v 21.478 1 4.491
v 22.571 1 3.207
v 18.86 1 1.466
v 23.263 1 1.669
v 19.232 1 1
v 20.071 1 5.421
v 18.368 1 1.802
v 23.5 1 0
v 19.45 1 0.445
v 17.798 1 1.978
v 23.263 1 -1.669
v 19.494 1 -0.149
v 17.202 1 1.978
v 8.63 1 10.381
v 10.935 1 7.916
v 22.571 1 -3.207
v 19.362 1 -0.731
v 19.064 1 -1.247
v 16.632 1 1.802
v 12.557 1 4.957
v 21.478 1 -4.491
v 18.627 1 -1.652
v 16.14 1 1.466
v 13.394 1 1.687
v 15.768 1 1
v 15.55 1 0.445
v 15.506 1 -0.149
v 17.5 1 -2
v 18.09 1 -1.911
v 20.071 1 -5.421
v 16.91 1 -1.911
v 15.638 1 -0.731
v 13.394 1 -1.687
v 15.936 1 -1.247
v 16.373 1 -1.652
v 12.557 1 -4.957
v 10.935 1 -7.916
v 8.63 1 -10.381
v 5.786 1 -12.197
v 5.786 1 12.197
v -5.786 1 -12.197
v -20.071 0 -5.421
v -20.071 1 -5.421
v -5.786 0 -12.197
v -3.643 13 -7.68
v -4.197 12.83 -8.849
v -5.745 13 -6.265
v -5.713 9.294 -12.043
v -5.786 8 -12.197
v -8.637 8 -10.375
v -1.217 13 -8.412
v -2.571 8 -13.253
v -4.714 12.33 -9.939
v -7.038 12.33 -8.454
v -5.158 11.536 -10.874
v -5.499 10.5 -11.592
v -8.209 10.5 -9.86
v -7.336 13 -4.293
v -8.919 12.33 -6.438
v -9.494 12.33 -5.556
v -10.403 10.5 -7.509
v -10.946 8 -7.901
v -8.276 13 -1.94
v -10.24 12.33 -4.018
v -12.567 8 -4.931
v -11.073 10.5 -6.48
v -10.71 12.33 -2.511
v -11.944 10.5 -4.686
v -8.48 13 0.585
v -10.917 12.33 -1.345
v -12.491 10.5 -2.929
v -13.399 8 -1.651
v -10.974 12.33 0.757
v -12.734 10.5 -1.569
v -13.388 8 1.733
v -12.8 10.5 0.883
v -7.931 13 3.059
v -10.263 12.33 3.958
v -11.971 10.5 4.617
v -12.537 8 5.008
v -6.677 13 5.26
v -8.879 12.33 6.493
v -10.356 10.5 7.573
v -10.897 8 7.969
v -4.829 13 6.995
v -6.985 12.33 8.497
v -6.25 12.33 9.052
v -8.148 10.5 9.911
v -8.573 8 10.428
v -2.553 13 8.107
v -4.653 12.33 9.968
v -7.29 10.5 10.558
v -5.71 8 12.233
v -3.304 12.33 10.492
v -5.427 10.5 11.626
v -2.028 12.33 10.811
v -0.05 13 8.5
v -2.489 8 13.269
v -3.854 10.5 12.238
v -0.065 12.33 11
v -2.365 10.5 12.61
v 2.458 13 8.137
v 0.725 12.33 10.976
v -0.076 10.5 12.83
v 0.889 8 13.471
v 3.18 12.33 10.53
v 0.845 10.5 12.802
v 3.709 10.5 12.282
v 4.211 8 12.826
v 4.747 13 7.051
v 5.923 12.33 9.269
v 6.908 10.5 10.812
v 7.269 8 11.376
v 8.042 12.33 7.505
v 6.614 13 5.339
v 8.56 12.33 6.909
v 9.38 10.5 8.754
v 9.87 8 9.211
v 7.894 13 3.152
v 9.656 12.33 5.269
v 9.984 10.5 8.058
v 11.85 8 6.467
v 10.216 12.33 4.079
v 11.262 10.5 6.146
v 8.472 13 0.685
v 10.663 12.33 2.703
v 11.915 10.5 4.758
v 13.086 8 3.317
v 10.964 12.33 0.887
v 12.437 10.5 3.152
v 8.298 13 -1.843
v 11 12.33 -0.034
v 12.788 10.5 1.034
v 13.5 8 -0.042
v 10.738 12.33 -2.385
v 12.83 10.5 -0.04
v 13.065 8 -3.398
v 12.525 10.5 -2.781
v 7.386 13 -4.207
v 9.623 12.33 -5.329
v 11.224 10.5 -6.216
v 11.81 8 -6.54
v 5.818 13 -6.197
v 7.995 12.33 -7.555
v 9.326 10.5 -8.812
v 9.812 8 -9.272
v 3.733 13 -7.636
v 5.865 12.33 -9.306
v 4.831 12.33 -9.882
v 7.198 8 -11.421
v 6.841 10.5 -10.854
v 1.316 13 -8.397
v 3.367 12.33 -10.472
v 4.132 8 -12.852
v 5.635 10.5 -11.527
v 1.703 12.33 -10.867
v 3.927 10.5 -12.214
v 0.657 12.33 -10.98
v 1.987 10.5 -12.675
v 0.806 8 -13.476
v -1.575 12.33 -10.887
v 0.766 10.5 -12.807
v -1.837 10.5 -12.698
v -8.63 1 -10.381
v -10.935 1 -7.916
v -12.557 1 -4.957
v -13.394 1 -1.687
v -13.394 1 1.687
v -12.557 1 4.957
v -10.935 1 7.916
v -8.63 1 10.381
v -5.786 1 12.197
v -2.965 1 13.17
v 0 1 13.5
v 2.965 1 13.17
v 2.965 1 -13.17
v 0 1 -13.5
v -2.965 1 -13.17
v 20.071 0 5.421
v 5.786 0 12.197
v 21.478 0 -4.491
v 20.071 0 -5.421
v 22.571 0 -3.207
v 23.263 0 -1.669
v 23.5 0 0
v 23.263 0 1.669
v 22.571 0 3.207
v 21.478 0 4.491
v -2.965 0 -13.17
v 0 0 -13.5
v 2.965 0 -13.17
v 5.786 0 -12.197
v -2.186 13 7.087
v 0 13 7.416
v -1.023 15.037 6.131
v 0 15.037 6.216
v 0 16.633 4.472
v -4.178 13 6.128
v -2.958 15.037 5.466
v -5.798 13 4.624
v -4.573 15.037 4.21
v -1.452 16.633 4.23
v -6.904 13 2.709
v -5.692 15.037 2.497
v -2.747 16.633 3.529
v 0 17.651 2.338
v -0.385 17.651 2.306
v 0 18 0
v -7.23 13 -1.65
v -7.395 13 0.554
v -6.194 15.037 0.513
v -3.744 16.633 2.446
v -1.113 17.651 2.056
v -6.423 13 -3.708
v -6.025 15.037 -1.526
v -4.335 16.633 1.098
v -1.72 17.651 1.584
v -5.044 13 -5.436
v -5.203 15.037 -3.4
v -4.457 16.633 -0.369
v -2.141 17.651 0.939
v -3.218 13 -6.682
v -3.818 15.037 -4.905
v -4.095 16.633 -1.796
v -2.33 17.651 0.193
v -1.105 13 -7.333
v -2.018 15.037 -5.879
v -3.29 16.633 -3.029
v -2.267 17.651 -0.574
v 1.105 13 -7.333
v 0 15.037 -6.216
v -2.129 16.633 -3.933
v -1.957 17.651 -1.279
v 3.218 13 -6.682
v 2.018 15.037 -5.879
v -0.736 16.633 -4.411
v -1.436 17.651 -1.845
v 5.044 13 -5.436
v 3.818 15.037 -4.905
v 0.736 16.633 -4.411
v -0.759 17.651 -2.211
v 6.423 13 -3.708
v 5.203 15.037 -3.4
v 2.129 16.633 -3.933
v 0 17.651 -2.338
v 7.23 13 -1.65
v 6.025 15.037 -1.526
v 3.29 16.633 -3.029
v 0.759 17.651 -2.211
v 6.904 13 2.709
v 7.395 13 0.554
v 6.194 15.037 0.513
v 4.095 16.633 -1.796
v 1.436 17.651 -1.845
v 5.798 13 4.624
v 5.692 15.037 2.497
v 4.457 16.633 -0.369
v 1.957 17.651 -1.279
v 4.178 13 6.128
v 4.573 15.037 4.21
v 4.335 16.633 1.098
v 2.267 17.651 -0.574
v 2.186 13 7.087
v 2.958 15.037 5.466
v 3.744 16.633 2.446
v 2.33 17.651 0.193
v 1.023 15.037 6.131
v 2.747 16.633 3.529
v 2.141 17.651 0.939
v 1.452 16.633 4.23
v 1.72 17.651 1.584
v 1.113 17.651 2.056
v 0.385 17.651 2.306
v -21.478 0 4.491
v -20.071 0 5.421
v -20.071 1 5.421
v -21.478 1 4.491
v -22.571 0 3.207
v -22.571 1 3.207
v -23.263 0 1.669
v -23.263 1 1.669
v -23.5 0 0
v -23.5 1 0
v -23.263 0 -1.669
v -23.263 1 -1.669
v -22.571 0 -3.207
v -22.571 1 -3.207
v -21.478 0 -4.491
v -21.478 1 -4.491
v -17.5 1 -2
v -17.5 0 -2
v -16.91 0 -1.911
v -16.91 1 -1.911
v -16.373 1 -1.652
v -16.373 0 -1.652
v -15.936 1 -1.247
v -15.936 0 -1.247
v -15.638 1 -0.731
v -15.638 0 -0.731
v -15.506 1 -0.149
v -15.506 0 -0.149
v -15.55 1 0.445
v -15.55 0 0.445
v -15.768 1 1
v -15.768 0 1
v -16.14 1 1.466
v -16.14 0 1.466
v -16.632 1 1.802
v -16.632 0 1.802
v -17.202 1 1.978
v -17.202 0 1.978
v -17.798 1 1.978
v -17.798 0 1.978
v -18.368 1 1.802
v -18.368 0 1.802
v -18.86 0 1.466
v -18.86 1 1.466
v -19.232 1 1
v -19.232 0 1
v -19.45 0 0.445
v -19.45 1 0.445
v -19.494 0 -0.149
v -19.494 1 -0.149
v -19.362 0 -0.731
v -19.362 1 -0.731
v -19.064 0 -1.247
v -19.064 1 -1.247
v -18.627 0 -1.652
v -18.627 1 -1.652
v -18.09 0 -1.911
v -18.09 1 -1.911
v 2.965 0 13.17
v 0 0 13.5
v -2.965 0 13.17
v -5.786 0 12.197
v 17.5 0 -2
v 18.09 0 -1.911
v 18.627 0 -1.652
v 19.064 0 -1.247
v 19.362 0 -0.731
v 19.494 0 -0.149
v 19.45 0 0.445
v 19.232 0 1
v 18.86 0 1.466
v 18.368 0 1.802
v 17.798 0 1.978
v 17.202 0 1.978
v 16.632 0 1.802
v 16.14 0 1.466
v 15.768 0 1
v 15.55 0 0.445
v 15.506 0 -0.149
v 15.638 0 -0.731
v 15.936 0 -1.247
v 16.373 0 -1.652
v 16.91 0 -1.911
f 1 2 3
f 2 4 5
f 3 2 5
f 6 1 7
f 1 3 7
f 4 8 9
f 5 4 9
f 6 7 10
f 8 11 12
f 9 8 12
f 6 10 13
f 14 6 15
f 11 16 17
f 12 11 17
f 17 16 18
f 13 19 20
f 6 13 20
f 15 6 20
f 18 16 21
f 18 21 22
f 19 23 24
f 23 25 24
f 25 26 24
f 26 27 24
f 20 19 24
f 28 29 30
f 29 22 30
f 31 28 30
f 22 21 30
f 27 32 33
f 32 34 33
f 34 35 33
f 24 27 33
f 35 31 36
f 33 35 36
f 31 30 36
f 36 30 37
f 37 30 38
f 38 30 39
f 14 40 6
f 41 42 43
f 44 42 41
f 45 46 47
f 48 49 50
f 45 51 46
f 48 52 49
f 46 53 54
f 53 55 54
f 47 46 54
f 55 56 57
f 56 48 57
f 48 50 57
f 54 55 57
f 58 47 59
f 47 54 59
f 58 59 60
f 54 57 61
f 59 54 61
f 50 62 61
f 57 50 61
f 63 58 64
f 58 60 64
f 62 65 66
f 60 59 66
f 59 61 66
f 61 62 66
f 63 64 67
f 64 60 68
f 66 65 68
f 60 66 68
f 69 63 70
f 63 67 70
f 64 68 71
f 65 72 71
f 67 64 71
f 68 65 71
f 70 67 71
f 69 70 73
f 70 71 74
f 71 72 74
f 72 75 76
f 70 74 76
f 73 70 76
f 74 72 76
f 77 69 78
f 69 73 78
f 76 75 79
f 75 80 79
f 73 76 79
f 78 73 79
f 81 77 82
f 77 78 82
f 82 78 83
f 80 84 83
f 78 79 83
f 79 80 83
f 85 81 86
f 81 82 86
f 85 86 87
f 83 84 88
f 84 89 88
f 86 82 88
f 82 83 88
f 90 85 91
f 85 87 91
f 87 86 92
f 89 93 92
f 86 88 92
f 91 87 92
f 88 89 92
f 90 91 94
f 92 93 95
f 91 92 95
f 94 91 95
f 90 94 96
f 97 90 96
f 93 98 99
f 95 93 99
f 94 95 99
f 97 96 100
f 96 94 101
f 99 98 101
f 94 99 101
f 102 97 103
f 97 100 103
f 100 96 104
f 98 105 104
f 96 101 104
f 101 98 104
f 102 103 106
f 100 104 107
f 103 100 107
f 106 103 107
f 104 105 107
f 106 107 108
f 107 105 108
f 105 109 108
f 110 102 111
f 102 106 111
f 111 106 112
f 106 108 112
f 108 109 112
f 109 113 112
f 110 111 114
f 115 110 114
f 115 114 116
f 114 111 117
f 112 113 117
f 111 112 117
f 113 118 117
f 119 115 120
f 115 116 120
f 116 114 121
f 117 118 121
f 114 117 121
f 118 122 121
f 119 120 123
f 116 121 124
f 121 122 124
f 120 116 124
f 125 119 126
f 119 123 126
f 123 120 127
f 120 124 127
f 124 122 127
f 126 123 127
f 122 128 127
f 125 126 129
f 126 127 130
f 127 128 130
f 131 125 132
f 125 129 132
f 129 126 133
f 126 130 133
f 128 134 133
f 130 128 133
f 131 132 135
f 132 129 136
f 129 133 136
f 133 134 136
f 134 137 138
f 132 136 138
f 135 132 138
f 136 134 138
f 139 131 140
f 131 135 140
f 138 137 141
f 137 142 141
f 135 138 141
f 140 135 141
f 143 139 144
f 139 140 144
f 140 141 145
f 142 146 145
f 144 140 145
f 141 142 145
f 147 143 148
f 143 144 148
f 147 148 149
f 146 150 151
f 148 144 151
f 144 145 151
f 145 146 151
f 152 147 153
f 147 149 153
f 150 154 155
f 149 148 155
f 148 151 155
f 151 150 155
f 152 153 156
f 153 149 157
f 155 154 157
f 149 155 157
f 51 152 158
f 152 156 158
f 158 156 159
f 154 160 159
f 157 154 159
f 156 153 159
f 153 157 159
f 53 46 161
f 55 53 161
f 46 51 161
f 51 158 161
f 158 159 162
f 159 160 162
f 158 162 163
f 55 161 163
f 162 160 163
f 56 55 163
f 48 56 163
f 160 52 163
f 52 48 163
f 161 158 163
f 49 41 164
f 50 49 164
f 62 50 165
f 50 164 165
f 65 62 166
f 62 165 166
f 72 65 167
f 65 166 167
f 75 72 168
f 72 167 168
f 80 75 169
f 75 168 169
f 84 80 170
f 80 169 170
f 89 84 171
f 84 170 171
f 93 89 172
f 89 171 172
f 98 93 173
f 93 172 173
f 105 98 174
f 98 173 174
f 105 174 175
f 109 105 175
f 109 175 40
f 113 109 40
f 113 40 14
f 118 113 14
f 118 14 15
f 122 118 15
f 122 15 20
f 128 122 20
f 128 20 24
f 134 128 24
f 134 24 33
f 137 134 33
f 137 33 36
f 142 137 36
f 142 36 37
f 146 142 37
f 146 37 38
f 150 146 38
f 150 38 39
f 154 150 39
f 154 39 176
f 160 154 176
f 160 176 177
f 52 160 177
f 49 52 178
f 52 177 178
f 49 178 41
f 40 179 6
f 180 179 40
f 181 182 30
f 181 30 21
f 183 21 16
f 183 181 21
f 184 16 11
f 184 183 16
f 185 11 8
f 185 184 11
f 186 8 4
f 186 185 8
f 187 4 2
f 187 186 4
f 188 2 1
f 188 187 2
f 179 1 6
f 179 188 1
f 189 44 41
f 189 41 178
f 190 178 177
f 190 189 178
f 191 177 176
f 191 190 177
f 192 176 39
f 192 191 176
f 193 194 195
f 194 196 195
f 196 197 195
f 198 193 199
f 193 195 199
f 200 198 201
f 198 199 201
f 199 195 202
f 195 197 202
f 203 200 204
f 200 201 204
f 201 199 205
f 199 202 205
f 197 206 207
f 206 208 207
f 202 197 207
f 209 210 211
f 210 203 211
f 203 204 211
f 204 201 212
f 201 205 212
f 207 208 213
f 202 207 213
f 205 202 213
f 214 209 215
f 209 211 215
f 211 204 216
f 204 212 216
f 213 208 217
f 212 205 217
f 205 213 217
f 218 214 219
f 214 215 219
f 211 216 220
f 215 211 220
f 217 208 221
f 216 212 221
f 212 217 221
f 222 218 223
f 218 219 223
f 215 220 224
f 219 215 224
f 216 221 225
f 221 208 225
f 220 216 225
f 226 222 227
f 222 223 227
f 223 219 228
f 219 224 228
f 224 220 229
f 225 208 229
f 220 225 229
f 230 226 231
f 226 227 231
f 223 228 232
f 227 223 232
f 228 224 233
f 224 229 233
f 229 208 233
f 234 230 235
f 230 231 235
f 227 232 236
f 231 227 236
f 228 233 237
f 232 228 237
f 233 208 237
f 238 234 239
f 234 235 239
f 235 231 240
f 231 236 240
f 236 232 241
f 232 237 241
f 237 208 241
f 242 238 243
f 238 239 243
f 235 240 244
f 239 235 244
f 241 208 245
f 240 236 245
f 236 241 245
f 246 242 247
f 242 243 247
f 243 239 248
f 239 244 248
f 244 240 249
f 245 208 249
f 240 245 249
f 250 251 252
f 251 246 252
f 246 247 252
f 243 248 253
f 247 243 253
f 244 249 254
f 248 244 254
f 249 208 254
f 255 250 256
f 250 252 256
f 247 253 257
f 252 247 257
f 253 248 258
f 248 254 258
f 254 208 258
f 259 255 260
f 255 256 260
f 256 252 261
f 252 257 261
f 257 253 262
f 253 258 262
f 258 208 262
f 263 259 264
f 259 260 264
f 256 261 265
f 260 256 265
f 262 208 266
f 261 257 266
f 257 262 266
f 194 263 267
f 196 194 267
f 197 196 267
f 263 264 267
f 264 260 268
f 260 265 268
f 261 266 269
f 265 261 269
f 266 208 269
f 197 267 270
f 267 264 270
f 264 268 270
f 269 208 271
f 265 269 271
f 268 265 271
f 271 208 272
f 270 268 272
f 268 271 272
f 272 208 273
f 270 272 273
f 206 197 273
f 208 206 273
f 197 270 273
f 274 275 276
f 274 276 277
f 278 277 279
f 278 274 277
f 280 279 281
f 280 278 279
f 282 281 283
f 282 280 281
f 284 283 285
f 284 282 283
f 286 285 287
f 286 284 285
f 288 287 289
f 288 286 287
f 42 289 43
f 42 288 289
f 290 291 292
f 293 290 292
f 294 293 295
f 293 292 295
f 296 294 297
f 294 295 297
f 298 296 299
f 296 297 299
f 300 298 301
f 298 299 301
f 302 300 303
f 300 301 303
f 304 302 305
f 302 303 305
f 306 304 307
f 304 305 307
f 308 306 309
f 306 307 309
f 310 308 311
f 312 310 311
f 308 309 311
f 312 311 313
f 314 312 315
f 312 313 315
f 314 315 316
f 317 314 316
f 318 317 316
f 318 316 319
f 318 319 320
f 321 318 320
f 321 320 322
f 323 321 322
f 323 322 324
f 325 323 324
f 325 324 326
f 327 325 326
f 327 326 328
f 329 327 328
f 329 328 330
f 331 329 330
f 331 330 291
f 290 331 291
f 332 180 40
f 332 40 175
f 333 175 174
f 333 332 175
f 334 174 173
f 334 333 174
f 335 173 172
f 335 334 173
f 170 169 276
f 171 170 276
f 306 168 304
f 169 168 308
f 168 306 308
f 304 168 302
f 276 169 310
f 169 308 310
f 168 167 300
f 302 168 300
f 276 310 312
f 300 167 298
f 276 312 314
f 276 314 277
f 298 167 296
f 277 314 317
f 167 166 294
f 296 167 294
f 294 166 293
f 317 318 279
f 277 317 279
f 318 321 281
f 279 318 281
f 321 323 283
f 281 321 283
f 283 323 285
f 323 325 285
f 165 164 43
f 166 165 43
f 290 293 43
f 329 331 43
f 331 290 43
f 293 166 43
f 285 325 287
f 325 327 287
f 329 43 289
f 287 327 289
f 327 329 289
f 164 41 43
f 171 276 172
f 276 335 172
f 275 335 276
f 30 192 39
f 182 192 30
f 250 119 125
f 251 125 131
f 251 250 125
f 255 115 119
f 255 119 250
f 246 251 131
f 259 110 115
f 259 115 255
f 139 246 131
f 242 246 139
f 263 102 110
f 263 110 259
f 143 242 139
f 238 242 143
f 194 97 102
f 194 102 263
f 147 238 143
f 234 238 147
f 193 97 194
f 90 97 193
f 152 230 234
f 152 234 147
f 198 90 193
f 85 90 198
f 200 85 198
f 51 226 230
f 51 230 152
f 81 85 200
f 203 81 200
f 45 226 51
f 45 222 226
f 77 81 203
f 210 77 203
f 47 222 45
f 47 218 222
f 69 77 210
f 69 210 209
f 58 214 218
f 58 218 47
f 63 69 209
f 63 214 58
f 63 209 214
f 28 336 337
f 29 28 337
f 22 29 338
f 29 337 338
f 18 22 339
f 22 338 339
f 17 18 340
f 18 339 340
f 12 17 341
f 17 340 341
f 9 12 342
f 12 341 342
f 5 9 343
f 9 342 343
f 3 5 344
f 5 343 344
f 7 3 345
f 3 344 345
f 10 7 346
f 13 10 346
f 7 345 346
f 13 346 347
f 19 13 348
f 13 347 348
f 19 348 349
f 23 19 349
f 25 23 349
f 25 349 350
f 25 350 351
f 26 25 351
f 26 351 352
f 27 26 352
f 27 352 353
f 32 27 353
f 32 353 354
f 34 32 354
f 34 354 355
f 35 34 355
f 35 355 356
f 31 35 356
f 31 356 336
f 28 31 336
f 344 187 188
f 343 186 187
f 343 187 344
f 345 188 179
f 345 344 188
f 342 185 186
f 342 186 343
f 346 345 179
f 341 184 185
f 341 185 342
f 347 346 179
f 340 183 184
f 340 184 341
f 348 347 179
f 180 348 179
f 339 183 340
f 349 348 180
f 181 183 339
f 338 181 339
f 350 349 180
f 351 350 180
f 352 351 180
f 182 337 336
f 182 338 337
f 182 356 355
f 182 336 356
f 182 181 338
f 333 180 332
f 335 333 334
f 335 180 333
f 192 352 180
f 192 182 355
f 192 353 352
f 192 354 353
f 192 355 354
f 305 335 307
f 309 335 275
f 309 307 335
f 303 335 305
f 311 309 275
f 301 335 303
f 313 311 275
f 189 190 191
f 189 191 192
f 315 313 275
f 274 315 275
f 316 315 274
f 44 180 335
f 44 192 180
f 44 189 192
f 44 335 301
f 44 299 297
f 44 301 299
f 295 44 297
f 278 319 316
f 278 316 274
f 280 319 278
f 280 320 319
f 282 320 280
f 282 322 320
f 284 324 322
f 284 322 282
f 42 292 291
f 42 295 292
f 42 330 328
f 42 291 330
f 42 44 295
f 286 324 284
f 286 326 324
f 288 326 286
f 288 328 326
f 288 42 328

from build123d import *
from build123d.topology import SkipClean

# Parameters (mm, degrees)
EXTRUDE_1_DEPTH     = 1
SKETCH_2_R          = 13.5
EXTRUDE_2_DEPTH     = 12
FILLET_1_R          = 5
SKETCH_5_R          = 2
CUT_EXTRUDE_1_DEPTH = 33.53459697


with BuildPart() as part:
    # 草图1 → 凸台-拉伸1 (new body)
    with BuildSketch(Plane(origin=(0, 0, 0), x_dir=(1, 0, 0), z_dir=(0, 1, 0))):
        with BuildLine():
            Line((-20.071428571, 5.421047417), (-5.785714286, 12.197356689))
            ThreePointArc((-5.785714286, 12.197356689), (0, 13.5), (5.785714286, 12.197356689))
            Line((5.785714286, 12.197356689), (20.071428571, 5.421047417))
            ThreePointArc((20.071428571, 5.421047417), (23.5, 0), (20.071428571, -5.421047417))
            Line((20.071428571, -5.421047417), (5.785714286, -12.197356689))
            ThreePointArc((5.785714286, -12.197356689), (0, -13.5), (-5.785714286, -12.197356689))
            Line((-5.785714286, -12.197356689), (-20.071428571, -5.421047417))
            ThreePointArc((-20.071428571, -5.421047417), (-23.5, 0), (-20.071428571, 5.421047417))
        make_face()
    extrude(amount=EXTRUDE_1_DEPTH)

    # 草图2 → 凸台-拉伸2 (add)
    with SkipClean():  # the faces are left unmerged after this step: merging them gives an invalid solid
        with BuildSketch(Plane(origin=(0, 1, 0), x_dir=(1, 0, 0), z_dir=(0, 1, 0))):
            with Locations(Location((0, 0, 0), (0, 0, 115.376933525))):
                Circle(SKETCH_2_R)
        extrude(amount=EXTRUDE_2_DEPTH)

    # 草图4 → 旋转1 (revolve)
    with SkipClean():  # the faces are left unmerged after this step: merging them gives an invalid solid
        with BuildSketch(Plane(origin=(0, 0, 0), x_dir=(0, 0, -1), z_dir=(1, 0, 0))):
            with BuildLine():
                Line((0, 18), (0, 2))
                ThreePointArc((0, 2), (-8, 10), (0, 18))
            make_face()
        revolve(axis=Axis((0, 18, 0), (0, -1, 0)))

    # 圆角1
    fillet_1_edges = [part.edges().sort_by_distance(p)[0] for p in [
        (5.785714286, 13, 12.197356689),
    ]]
    fillet(fillet_1_edges, radius=FILLET_1_R)

    # 草图5 → 切除-拉伸1 (cut, through all)
    with SkipClean():  # the faces are left unmerged after this step: merging them gives an invalid solid
        with BuildSketch(Plane.XZ):
            with Locations(Location((-17.5, 0, 0), (0, 0, 270))):
                Circle(SKETCH_5_R)
            with Locations(Location((17.5, 0, 0), (0, 0, 270))):
                Circle(SKETCH_5_R)
        extrude(amount=-CUT_EXTRUDE_1_DEPTH, mode=Mode.SUBTRACT)


solid = part.part
